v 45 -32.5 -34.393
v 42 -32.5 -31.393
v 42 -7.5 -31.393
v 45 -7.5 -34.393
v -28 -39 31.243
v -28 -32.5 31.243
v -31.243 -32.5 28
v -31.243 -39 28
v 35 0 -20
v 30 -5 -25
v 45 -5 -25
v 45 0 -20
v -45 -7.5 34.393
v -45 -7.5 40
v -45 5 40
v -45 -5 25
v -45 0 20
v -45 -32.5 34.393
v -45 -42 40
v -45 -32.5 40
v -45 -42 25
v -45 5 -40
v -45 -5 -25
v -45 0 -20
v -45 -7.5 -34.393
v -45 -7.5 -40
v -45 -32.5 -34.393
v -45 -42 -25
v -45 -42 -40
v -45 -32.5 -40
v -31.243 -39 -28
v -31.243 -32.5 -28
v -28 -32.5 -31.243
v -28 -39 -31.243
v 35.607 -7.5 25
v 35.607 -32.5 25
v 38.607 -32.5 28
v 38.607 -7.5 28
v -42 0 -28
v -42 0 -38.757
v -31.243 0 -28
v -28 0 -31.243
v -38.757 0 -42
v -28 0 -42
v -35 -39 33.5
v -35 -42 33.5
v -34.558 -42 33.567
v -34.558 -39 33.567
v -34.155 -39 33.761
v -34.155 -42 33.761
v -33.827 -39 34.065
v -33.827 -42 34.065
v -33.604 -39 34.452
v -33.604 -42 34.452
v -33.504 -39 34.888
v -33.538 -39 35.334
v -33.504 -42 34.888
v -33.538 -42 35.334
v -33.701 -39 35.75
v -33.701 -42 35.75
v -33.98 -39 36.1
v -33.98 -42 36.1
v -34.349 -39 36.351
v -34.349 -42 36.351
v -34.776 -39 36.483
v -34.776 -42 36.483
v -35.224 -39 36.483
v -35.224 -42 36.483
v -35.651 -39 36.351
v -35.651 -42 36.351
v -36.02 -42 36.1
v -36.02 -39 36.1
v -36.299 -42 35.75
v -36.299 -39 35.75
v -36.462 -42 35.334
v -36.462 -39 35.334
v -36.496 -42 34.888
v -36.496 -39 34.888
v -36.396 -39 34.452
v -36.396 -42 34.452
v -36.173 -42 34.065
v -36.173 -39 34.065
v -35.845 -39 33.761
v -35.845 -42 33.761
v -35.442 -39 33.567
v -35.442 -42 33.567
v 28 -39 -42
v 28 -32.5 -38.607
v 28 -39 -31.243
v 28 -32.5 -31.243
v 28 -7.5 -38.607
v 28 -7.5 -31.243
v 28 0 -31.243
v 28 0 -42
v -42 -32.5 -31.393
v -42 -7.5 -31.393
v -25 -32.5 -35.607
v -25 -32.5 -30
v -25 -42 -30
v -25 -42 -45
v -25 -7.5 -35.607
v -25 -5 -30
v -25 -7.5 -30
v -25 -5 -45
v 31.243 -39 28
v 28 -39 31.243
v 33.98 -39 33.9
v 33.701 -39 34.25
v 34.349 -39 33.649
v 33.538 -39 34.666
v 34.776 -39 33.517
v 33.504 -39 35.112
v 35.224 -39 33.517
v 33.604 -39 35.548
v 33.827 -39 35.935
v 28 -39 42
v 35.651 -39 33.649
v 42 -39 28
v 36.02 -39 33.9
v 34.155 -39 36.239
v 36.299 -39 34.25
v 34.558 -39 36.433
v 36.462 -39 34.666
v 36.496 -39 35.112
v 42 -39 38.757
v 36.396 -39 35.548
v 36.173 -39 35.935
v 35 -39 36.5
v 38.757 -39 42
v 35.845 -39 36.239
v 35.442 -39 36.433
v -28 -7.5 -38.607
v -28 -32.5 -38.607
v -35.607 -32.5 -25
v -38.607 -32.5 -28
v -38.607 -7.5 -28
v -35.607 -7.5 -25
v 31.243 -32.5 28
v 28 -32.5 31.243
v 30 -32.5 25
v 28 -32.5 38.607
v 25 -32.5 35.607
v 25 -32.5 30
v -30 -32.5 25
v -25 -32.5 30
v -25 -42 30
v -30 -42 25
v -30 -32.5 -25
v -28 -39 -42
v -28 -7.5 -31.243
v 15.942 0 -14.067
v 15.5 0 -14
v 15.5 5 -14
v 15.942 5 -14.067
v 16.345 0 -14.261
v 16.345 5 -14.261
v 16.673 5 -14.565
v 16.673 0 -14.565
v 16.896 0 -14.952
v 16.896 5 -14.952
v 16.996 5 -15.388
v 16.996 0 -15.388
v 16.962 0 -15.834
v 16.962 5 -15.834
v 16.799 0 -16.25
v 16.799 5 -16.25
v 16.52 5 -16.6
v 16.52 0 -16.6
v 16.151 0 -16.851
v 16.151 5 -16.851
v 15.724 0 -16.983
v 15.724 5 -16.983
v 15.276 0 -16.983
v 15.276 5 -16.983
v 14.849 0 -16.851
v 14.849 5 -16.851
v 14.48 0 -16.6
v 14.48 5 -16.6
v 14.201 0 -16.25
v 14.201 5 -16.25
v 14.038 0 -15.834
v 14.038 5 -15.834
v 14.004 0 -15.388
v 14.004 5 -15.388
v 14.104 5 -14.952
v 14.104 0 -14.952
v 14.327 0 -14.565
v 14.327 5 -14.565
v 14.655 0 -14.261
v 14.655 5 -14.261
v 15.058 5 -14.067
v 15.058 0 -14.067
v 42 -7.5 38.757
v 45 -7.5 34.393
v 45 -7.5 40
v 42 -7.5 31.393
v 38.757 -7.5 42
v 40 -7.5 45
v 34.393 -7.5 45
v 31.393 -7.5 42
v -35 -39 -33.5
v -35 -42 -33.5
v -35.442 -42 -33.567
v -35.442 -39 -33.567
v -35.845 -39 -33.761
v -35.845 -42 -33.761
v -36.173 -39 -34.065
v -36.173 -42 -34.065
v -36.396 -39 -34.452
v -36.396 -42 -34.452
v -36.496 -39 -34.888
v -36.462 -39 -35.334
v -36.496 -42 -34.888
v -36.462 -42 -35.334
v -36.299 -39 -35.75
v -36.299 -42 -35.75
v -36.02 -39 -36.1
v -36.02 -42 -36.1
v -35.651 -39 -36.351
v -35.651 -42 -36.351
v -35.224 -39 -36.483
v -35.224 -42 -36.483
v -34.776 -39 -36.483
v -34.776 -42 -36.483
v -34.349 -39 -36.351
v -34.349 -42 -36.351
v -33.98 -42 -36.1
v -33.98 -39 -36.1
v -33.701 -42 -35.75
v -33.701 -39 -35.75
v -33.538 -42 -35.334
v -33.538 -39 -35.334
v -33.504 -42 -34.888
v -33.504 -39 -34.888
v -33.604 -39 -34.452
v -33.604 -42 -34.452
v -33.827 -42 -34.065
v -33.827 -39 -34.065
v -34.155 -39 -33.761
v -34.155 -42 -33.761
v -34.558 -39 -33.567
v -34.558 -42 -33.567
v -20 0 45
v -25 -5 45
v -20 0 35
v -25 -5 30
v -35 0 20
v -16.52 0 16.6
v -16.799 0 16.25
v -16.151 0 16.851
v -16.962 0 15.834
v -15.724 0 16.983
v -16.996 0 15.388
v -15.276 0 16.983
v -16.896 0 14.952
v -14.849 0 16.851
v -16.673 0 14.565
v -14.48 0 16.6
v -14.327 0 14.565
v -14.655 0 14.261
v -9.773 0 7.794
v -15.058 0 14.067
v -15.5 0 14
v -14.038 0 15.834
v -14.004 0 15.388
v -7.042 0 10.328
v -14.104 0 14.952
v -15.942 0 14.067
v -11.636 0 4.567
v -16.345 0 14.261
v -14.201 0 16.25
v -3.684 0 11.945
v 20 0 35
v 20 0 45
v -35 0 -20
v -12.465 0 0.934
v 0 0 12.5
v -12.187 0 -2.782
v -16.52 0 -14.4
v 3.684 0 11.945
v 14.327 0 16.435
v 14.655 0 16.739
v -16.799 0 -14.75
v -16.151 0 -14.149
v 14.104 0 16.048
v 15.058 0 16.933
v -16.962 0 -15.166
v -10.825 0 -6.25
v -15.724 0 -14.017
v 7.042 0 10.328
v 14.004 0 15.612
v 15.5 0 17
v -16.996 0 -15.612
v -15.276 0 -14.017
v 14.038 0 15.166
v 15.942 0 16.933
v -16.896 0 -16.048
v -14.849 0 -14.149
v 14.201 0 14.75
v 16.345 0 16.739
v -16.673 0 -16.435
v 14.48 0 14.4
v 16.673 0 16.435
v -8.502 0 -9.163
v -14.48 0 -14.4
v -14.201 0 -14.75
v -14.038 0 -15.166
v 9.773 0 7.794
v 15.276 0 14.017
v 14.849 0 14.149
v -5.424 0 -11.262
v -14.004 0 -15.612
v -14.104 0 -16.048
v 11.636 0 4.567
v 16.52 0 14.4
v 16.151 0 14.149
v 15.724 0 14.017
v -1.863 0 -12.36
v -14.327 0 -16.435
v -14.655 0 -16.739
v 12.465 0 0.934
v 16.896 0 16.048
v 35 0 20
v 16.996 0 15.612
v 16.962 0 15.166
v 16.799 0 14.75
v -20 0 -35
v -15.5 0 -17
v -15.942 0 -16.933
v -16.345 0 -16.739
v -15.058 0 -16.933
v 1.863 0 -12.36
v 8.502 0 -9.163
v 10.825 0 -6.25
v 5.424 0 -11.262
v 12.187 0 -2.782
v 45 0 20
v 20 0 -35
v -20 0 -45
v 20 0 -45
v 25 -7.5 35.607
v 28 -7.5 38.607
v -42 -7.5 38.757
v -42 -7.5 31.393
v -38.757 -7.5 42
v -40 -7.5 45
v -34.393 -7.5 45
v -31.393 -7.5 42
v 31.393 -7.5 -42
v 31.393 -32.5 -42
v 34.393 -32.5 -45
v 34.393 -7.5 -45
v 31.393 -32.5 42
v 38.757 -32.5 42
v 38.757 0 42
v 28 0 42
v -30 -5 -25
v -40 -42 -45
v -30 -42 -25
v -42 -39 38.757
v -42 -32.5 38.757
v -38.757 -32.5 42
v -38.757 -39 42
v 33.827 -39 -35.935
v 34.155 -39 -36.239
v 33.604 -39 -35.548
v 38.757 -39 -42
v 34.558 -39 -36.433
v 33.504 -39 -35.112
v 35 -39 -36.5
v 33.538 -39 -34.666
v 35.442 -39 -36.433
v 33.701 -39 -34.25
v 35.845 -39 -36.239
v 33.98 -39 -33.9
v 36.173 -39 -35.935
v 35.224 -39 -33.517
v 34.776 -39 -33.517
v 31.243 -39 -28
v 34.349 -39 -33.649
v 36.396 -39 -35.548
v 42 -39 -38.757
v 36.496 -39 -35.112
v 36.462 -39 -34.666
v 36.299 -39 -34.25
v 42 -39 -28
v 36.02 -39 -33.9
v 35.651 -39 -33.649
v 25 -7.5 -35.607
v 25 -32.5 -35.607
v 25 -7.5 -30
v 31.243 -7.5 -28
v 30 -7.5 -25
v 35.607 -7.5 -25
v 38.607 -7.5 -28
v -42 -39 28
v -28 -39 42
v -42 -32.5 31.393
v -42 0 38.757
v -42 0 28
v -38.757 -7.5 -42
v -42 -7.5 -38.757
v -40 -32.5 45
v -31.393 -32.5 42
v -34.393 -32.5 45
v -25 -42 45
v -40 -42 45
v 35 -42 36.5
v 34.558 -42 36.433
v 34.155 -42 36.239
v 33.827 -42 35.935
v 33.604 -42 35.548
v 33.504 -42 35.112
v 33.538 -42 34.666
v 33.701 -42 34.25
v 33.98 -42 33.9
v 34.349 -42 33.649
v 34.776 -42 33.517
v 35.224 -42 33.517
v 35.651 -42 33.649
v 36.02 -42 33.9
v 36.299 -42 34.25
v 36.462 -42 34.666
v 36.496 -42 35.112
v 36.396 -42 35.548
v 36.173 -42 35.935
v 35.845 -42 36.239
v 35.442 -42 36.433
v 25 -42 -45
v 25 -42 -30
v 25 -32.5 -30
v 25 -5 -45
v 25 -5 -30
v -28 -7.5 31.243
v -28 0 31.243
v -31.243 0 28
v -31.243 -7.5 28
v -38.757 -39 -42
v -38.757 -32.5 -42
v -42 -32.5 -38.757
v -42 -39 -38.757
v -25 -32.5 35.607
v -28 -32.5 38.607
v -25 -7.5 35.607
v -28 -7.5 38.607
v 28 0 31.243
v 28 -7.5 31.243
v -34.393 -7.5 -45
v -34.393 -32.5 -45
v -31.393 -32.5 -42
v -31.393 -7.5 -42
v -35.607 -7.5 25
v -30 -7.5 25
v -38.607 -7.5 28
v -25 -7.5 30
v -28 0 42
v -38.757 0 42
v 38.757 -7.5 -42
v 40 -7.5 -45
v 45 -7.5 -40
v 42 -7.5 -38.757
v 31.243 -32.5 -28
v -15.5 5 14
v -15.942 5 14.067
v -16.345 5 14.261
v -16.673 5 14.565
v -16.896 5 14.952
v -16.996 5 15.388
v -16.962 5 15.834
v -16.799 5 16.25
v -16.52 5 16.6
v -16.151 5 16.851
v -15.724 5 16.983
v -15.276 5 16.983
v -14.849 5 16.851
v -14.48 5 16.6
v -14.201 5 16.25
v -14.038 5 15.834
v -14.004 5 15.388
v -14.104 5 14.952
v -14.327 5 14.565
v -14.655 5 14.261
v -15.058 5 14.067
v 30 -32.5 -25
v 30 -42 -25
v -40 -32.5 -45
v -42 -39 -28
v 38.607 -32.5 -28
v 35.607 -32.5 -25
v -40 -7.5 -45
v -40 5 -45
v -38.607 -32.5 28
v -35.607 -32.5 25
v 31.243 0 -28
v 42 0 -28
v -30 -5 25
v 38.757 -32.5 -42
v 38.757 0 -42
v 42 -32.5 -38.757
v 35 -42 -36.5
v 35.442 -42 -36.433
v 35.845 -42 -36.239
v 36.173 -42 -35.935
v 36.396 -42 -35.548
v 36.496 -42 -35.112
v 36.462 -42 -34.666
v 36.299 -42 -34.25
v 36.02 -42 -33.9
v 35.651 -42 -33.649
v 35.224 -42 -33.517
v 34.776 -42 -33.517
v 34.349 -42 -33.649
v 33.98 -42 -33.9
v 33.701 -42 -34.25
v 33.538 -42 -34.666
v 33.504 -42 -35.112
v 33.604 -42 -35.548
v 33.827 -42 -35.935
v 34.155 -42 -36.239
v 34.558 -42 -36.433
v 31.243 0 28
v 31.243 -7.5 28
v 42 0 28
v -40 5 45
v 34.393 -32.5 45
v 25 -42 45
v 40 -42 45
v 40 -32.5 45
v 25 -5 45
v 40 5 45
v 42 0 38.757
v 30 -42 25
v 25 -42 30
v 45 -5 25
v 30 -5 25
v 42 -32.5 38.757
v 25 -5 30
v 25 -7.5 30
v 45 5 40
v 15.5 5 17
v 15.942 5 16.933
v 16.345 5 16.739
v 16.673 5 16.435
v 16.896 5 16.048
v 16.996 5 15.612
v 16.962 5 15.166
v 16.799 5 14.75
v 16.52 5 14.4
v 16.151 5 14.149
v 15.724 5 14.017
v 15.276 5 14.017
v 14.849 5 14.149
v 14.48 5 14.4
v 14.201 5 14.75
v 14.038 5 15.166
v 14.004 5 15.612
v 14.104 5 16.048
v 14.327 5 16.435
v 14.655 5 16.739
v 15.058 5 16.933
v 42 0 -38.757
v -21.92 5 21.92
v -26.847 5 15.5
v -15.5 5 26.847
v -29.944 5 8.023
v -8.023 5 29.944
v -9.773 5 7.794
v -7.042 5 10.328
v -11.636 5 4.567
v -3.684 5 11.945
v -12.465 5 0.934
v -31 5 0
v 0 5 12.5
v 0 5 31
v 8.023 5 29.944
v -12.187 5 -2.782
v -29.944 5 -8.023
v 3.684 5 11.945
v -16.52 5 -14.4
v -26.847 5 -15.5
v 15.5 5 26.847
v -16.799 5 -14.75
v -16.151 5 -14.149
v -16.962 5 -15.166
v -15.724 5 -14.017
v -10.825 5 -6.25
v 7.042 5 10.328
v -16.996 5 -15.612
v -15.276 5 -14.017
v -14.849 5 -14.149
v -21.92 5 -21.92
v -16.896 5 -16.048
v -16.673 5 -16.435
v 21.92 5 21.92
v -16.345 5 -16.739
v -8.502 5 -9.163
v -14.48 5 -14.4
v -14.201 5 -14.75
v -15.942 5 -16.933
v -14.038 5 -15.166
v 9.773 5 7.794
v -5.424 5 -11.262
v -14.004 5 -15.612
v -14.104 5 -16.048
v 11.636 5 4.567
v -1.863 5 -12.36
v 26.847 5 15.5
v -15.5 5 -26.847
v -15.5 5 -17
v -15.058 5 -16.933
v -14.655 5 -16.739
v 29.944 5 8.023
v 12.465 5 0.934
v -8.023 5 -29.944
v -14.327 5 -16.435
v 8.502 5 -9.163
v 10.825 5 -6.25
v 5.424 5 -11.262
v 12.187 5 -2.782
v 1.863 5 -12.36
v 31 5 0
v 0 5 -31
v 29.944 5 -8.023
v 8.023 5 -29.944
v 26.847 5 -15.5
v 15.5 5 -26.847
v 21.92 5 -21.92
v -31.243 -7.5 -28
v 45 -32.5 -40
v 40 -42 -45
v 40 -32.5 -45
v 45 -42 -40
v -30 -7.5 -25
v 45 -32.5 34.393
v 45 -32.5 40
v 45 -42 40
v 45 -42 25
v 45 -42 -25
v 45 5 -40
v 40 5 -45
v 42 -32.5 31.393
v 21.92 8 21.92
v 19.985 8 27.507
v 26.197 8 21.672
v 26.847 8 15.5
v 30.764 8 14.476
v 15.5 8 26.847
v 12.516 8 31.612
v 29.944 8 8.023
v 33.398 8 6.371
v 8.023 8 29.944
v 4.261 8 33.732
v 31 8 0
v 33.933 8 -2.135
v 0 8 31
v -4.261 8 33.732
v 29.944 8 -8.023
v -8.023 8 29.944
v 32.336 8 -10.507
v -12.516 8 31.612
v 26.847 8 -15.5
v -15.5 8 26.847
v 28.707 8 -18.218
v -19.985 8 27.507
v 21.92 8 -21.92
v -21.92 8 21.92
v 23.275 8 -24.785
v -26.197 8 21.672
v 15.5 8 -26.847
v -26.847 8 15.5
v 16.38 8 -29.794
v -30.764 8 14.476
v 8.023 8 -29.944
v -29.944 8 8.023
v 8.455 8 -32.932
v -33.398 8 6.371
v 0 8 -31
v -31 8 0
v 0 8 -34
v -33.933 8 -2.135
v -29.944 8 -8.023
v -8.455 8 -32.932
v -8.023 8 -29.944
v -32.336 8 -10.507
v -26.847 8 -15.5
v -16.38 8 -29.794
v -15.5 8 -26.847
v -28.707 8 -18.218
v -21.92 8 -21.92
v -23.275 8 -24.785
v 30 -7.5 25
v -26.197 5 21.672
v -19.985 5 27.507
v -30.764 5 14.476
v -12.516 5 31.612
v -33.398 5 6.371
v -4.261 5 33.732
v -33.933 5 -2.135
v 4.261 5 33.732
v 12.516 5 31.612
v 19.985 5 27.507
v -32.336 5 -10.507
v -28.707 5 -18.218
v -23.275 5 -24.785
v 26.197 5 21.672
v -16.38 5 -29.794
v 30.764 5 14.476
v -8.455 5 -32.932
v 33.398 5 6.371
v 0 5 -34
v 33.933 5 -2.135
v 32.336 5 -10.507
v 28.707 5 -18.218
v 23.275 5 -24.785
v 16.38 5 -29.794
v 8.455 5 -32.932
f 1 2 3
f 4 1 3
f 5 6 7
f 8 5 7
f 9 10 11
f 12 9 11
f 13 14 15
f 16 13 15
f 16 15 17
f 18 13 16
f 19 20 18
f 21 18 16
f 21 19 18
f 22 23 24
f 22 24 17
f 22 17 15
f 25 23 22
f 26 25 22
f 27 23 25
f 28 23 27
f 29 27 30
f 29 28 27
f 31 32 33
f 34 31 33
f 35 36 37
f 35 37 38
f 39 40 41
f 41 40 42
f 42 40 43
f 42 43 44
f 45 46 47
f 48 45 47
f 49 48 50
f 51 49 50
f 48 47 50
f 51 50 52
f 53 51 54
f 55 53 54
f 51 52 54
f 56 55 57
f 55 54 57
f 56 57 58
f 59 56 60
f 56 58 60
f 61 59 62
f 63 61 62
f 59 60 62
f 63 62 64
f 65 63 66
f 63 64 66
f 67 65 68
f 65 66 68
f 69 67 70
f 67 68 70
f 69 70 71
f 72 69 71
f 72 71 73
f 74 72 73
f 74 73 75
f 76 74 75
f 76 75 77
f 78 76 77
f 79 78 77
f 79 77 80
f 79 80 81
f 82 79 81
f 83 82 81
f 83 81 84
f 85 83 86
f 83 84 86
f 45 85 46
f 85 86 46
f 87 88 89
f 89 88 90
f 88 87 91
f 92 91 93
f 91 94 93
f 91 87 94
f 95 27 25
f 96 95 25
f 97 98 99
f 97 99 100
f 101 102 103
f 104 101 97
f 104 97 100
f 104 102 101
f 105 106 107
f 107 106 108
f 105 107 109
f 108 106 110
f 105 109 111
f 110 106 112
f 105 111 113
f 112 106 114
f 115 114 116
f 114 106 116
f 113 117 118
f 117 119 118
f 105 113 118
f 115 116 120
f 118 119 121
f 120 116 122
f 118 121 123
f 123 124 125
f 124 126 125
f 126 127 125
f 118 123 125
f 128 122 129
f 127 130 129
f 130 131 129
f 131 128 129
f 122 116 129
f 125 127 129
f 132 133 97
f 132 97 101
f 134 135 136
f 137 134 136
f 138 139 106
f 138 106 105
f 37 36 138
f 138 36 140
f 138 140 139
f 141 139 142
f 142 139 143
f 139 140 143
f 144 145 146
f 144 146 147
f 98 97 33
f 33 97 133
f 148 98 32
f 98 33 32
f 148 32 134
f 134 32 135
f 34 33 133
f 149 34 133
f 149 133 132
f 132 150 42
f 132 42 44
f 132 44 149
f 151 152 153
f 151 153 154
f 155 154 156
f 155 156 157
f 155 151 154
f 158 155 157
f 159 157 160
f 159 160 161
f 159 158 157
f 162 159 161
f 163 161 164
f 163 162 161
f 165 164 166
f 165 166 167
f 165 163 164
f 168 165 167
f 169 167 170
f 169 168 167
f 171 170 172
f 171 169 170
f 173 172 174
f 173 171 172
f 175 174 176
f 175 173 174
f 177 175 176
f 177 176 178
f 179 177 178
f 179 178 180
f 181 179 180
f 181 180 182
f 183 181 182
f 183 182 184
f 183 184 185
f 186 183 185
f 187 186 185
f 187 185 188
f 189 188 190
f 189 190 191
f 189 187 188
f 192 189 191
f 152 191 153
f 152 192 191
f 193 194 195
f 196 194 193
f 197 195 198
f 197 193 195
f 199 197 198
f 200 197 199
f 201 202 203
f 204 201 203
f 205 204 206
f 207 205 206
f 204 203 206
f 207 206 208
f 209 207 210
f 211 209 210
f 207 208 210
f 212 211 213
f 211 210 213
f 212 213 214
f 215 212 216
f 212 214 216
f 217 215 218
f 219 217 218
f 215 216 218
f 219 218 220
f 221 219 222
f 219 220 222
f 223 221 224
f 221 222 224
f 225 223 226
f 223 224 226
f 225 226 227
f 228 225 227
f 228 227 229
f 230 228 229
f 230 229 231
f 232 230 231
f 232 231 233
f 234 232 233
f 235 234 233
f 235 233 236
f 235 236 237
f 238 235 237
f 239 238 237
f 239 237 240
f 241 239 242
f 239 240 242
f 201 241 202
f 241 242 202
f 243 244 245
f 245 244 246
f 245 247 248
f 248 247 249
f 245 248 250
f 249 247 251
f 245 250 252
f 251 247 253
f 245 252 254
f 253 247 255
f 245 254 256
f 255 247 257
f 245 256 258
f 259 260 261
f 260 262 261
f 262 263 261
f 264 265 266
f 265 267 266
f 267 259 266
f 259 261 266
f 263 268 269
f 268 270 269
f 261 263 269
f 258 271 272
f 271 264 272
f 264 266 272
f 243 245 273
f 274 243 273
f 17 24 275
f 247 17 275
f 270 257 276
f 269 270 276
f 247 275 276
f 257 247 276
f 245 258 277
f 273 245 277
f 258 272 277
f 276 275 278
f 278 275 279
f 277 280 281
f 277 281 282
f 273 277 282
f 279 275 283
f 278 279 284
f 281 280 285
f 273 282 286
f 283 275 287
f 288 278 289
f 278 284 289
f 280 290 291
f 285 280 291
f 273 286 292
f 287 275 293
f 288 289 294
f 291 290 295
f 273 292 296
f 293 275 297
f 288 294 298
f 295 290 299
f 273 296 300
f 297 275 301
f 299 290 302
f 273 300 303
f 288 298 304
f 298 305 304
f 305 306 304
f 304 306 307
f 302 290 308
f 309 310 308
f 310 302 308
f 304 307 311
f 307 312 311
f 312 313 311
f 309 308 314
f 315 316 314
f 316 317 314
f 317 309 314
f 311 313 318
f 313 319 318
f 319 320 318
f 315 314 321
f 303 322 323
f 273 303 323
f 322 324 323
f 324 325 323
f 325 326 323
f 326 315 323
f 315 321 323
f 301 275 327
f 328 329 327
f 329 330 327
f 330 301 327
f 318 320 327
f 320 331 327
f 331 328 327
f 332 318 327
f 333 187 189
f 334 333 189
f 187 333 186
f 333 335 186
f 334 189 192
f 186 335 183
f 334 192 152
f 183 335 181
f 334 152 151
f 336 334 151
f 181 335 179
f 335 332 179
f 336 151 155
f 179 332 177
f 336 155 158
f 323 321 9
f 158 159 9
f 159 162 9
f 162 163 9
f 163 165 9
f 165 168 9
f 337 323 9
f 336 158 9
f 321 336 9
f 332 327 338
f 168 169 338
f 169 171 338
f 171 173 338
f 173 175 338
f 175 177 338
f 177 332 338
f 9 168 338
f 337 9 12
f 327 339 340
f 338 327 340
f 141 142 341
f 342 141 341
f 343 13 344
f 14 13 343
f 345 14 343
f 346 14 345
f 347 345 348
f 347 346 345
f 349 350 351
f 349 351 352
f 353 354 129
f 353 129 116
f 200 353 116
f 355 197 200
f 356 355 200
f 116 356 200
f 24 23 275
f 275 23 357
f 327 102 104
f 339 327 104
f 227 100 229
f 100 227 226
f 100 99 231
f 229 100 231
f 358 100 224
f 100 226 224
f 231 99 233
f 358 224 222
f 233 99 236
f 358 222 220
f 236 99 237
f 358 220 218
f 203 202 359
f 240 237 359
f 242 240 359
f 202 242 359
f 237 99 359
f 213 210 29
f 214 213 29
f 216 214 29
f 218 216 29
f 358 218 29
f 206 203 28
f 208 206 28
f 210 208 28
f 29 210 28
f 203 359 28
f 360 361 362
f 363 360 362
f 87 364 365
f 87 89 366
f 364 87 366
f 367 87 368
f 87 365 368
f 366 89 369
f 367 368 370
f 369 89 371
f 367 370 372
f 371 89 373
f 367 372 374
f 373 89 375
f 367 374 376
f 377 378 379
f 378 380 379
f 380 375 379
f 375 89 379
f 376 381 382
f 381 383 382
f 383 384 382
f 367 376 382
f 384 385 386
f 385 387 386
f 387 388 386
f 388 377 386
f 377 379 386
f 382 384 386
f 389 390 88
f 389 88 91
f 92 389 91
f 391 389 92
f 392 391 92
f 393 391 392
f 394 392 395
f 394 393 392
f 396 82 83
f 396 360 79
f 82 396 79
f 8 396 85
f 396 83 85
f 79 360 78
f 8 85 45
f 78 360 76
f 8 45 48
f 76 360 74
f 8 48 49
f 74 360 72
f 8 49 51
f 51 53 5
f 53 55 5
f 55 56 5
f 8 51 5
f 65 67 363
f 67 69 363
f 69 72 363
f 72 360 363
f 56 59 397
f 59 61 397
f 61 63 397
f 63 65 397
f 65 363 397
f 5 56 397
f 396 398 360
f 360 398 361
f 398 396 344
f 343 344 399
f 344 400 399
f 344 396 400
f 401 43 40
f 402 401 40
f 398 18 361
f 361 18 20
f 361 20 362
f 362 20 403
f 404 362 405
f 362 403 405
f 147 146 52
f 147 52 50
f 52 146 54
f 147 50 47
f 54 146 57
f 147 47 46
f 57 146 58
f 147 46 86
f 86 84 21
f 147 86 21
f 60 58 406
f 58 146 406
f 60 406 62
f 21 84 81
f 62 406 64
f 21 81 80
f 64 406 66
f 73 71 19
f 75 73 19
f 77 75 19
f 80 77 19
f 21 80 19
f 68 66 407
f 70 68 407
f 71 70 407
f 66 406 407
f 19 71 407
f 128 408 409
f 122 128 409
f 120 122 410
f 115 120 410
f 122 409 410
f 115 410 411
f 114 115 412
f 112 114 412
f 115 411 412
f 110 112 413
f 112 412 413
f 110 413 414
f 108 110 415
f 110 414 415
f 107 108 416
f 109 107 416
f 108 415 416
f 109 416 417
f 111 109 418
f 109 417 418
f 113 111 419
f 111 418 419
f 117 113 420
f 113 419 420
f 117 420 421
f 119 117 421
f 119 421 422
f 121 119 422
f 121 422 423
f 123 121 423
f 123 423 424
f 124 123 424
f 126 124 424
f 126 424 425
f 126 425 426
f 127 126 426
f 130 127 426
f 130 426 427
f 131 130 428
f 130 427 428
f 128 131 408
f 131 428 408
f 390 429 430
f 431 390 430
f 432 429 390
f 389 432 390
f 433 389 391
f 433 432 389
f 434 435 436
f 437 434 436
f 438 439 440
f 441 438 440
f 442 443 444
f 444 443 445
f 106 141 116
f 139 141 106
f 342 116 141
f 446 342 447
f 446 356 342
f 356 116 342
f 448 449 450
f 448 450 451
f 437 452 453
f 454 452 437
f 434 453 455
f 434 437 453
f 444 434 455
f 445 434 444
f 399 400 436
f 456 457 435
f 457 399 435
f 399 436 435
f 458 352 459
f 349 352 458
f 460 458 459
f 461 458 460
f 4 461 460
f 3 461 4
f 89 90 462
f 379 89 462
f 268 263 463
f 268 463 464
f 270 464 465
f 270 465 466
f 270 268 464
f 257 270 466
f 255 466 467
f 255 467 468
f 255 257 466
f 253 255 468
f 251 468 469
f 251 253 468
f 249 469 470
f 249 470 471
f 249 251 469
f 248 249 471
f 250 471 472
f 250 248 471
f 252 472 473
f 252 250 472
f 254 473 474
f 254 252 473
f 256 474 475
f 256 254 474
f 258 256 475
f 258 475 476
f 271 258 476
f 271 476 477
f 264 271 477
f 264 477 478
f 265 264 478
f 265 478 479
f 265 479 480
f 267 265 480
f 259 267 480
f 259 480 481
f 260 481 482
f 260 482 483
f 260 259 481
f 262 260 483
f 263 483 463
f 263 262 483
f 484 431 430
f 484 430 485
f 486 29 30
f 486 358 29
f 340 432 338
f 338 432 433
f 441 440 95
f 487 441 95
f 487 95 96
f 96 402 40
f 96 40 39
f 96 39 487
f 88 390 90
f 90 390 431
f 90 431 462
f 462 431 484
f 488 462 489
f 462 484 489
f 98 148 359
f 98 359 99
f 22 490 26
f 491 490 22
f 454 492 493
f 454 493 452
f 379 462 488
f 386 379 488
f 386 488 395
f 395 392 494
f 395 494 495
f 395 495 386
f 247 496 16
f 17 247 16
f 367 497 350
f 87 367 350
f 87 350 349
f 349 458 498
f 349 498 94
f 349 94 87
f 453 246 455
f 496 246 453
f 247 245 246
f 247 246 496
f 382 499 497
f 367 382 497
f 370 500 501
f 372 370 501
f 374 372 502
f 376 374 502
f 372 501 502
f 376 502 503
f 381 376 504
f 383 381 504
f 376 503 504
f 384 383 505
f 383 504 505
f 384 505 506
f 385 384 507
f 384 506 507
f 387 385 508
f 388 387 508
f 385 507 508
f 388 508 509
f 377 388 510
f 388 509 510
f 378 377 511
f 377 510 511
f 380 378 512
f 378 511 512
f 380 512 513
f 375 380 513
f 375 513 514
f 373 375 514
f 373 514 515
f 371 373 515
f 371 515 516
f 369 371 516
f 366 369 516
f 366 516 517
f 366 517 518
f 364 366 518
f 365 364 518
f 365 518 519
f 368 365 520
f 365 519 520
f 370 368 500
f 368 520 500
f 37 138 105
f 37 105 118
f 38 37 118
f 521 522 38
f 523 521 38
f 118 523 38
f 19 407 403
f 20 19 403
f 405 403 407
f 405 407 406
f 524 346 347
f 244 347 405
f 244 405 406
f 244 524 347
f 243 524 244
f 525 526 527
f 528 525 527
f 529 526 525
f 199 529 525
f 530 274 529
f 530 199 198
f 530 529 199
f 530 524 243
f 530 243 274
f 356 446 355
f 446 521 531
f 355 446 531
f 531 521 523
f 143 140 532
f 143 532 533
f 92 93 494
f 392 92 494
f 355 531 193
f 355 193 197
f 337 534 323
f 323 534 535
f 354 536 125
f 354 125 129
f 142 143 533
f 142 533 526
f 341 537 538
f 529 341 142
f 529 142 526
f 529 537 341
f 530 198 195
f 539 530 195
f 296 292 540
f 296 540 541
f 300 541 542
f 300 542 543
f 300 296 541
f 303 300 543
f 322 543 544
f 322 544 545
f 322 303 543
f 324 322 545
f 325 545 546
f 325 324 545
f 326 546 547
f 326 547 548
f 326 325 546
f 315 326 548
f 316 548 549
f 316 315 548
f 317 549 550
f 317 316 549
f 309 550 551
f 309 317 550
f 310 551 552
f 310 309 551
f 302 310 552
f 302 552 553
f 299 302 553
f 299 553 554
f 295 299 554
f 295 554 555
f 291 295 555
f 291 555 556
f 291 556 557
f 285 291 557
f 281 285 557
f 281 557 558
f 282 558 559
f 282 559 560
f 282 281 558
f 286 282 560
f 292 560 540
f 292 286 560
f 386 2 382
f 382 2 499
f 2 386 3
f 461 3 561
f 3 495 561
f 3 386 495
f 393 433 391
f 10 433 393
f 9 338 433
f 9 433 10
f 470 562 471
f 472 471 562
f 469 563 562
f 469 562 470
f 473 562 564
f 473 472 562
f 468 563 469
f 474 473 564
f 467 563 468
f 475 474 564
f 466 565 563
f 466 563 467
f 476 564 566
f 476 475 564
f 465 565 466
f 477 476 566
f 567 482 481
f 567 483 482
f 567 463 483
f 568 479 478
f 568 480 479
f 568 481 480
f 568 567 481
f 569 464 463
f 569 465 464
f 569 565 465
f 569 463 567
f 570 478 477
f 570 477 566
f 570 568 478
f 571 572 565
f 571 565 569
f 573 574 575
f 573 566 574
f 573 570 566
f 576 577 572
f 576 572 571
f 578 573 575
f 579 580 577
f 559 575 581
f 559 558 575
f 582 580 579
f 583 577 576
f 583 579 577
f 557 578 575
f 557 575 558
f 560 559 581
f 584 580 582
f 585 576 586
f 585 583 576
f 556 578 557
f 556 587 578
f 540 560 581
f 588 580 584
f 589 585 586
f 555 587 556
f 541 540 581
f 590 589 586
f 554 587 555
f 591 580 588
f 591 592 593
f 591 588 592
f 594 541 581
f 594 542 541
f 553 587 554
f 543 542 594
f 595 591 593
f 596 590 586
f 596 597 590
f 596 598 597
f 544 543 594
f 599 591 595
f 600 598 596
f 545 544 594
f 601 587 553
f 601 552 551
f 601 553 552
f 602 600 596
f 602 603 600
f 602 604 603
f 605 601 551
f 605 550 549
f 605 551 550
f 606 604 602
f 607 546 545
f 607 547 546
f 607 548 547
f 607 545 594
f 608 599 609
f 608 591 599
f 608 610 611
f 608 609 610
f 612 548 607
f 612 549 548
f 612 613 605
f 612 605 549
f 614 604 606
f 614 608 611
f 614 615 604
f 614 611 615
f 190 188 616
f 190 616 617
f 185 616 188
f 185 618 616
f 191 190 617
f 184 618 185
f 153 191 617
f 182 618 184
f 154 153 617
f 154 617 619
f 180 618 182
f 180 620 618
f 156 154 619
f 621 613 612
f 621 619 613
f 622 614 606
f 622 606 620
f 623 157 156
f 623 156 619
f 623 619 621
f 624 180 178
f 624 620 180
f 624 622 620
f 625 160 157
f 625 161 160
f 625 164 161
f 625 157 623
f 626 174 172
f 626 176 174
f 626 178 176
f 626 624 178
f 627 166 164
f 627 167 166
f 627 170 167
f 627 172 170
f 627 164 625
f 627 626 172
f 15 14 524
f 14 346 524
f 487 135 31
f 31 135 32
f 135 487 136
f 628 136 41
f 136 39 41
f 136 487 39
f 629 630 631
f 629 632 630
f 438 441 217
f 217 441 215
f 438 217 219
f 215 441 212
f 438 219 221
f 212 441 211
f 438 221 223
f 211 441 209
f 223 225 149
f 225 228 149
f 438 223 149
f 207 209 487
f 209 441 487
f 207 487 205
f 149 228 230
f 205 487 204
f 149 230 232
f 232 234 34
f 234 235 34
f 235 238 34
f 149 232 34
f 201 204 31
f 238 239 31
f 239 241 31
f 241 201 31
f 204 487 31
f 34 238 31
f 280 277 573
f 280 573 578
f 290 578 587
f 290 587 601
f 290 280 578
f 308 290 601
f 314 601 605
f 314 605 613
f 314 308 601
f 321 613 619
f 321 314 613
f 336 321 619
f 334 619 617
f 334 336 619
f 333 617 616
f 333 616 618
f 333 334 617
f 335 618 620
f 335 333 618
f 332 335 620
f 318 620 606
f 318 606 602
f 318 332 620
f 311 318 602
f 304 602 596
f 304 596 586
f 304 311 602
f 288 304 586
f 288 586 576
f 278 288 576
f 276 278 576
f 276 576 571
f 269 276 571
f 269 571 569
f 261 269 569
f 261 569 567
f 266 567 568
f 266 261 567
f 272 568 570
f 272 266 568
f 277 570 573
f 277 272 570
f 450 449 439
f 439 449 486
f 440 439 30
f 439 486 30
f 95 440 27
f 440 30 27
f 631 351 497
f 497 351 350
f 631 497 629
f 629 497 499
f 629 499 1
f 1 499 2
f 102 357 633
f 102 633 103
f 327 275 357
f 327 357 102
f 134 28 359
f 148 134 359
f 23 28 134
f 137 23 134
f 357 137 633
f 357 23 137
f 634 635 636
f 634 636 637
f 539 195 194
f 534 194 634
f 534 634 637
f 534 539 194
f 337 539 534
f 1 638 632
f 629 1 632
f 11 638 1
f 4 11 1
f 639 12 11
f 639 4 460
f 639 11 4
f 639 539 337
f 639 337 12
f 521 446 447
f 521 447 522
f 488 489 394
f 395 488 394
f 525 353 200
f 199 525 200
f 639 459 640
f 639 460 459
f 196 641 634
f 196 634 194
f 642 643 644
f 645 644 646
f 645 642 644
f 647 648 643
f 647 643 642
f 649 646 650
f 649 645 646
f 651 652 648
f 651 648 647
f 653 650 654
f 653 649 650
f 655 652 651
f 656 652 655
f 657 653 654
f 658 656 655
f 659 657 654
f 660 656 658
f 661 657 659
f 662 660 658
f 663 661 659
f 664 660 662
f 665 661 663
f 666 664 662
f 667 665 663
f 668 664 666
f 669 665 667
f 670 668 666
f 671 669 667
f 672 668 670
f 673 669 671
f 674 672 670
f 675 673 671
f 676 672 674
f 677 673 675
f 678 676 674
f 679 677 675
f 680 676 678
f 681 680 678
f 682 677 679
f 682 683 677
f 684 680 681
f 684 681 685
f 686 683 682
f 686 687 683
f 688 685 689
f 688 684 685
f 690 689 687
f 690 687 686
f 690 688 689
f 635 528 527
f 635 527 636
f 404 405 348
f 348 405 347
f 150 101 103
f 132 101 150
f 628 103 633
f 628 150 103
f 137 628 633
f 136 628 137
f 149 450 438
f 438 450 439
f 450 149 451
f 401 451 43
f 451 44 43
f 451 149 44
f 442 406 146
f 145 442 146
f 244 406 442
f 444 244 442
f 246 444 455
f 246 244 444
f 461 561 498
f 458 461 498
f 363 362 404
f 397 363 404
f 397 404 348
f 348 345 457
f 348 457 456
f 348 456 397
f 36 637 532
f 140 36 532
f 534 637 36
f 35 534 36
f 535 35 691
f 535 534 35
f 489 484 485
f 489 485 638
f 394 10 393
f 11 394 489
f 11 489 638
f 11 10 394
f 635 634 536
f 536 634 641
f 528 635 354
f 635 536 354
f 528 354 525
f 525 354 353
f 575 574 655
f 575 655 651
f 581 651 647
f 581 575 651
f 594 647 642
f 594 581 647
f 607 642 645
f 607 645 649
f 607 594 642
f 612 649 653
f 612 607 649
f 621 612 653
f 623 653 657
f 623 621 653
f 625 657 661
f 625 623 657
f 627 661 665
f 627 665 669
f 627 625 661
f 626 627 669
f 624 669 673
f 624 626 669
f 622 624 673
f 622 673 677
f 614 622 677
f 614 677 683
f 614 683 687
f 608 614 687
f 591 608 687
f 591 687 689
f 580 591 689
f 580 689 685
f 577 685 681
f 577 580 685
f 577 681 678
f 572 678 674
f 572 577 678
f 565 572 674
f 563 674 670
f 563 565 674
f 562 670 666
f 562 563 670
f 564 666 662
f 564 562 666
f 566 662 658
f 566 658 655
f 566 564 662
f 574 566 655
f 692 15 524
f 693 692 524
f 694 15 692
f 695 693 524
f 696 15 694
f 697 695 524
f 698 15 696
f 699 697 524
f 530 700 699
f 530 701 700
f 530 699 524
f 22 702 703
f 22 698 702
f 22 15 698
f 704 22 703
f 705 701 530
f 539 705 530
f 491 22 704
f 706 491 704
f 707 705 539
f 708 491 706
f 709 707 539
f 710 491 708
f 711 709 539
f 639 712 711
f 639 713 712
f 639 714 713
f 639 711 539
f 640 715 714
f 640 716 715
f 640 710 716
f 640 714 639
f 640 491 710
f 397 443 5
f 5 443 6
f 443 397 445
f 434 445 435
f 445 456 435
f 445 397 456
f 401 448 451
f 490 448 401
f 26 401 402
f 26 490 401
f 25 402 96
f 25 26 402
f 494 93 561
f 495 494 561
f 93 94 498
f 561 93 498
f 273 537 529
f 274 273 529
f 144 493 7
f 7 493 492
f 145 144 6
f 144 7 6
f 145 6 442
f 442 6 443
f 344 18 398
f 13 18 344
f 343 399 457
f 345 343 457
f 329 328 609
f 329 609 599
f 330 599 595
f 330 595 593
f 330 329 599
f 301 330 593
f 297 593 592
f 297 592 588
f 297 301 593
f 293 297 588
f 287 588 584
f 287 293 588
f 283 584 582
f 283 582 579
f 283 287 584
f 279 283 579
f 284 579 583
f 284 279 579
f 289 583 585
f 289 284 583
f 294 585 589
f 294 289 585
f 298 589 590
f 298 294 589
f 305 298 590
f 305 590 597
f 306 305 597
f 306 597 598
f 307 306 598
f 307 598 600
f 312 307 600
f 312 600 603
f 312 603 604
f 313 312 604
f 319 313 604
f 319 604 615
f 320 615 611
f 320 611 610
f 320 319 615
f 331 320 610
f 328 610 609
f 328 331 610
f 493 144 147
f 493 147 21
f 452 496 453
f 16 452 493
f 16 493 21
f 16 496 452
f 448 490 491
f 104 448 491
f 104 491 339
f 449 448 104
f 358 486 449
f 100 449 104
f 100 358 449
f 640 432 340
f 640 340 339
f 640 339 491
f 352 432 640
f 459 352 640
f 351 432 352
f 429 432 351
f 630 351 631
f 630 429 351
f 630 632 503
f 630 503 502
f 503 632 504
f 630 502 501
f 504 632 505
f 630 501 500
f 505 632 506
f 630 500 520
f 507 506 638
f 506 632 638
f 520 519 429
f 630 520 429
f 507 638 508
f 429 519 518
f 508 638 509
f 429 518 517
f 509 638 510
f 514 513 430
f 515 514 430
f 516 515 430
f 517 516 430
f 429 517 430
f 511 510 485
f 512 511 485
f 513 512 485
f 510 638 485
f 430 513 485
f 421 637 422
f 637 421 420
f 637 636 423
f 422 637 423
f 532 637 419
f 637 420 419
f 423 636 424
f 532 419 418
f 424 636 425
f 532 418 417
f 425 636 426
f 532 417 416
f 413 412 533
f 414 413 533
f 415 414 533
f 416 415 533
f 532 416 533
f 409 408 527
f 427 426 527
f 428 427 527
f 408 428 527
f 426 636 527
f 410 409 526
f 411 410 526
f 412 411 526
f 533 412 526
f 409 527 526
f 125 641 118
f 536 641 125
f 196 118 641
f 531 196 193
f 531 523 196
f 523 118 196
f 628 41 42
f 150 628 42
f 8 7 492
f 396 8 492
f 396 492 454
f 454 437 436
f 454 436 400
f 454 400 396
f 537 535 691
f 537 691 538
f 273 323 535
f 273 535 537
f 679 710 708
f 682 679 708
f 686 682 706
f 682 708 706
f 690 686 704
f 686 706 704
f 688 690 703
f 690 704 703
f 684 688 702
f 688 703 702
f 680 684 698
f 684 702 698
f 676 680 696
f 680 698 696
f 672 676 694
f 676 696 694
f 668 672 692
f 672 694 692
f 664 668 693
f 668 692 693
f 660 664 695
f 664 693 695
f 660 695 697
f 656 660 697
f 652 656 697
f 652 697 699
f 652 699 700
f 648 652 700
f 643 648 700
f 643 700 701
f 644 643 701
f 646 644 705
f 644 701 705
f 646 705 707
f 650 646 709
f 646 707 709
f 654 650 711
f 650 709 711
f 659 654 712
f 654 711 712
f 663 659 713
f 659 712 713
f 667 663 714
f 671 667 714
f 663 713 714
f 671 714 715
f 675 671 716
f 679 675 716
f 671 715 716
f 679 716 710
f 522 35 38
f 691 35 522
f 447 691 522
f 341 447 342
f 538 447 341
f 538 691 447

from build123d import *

# Parameters (mm, degrees)
SKETCH_1_W               = 90
SKETCH_1_H               = 90.00000171
SKETCH_1_R               = 12.5
SKETCH_1_R_2             = 1.5
EXTRUDE_1_DEPTH          = 5
CHAMFER_1_SIZE           = 5
SKETCH_2_R               = 34
SKETCH_2_R_2             = 31
EXTRUDE_2_DEPTH          = 3
EXTRUDE_3_DEPTH          = 42
CHAMFER_2_SIZE           = 5
SKETCH_4_W               = 15
SKETCH_4_H               = 25
CUT_EXTRUDE_1_DEPTH      = 157
PATTERN_CIRCULAR_1_COUNT = 2
PATTERN_CIRCULAR_1_ANGLE = 90
SKETCH_5_R               = 1.5
EXTRUDE_4_DEPTH          = 3


with BuildPart() as part:
    # 草图1 → 凸台-拉伸1 (new body)
    with BuildSketch(Plane(origin=(0, 0, 0), x_dir=(1, 0, 0), z_dir=(0, 1, 0))):
        Rectangle(SKETCH_1_W, SKETCH_1_H)
        with Locations(Location((0, 0, 0), (0, 0, 270))):
            Circle(SKETCH_1_R, mode=Mode.SUBTRACT)
        with Locations(Location((15.5, 15.500000294, 0), (0, 0, 270))):
            Circle(SKETCH_1_R_2, mode=Mode.SUBTRACT)
        with Locations(Location((-15.500000589, -15.499999706, 0), (0, 0, 90))):
            Circle(SKETCH_1_R_2, mode=Mode.SUBTRACT)
        with Locations(Location((15.500000589, -15.499999706, 0), (0, 0, 270))):
            Circle(SKETCH_1_R_2, mode=Mode.SUBTRACT)
        with Locations(Location((-15.5, 15.500000294, 0), (0, 0, 90))):
            Circle(SKETCH_1_R_2, mode=Mode.SUBTRACT)
    extrude(amount=EXTRUDE_1_DEPTH)

    # 倒角1
    chamfer_1_edges = [part.edges().sort_by_distance(p)[0] for p in [
        (45, 2.5, 45.000000855),
        (-45, 2.5, 45.000000855),
        (-45, 2.5, -45.000000855),
        (45, 2.5, -45.000000855),
    ]]
    chamfer(chamfer_1_edges, length=CHAMFER_1_SIZE)

    # 草图2 → 凸台-拉伸2 (add)
    with BuildSketch(Plane(origin=(0, 5, 0), x_dir=(1, 0, 0), z_dir=(0, 1, 0))):
        with Locations(Location((0, 0, 0), (0, 0, 90))):
            Circle(SKETCH_2_R)
        with Locations(Location((0, 0, 0), (0, 0, 270))):
            Circle(SKETCH_2_R_2, mode=Mode.SUBTRACT)
    extrude(amount=EXTRUDE_2_DEPTH)

    # 草图3 → 凸台-拉伸3 (add)
    # profile 1 of 4: a face of its own
    with BuildSketch(Plane.XZ):
        Polygon((25, 45.000000855), (40, 45.000000855), (45, 40.000000855), (45, 25.000000855), (30, 25.000000855), (25, 30.000000855), align=None)
        Polygon((28, 31.242641542), (31.242640687, 28.000000855), (42, 28.000000855), (42, 38.757360167), (38.757359313, 42.000000855), (28, 42.000000855), align=None, mode=Mode.SUBTRACT)
    # profile 2 of 4: a face of its own
    with BuildSketch(Plane.XZ):
        Polygon((25, -45.000000855), (25, -30.000000855), (30, -25.000000855), (45, -25.000000855), (45, -40.000000855), (40, -45.000000855), align=None)
        Polygon((28, -42.000000855), (28, -31.242641542), (31.242640687, -28.000000855), (42, -28.000000855), (42, -38.757360167), (38.757359313, -42.000000855), align=None, mode=Mode.SUBTRACT)
    # profile 3 of 4: a face of its own
    with BuildSketch(Plane.XZ):
        Polygon((-25, -45.000000855), (-40, -45.000000855), (-45, -40.000000855), (-45, -25.000000855), (-30, -25.000000855), (-25, -30.000000855), align=None)
        Polygon((-28, -42.000000855), (-38.757359313, -42.000000855), (-42, -38.757360167), (-42, -28.000000855), (-31.242640687, -28.000000855), (-28, -31.242641542), align=None, mode=Mode.SUBTRACT)
    # profile 4 of 4: a face of its own
    with BuildSketch(Plane.XZ):
        Polygon((-25, 45.000000855), (-25, 30.000000855), (-30, 25.000000855), (-45, 25.000000855), (-45, 40.000000855), (-40, 45.000000855), align=None)
        Polygon((-28, 42.000000855), (-28, 31.242641542), (-31.242640687, 28.000000855), (-42, 28.000000855), (-42, 38.757360167), (-38.757359313, 42.000000855), align=None, mode=Mode.SUBTRACT)
    extrude(amount=EXTRUDE_3_DEPTH)

    # 倒角2
    chamfer_2_edges = [part.edges().sort_by_distance(p)[0] for p in [
        (37.5, 0, -25.000000855),
        (25, 0, -37.500000855),
        (-25, 0, -37.500000855),
        (-37.5, 0, -25.000000855),
        (-37.5, 0, 25.000000855),
        (-25, 0, 37.500000855),
        (25, 0, 37.500000855),
        (37.5, 0, 25.000000855),
    ]]
    chamfer(chamfer_2_edges, length=CHAMFER_2_SIZE)

    # 草图4 → 切除-拉伸1 (cut)
    with BuildSketch(Plane(origin=(-42.500000427, 0, 42.500000427), x_dir=(0.7071067811865456, 0, 0.7071067811865495), z_dir=(-0.7071067811865495, 0, 0.7071067811865456))):
        with Locations((0, -20)):
            Rectangle(SKETCH_4_W, SKETCH_4_H)
    cut_extrude_1 = extrude(amount=-CUT_EXTRUDE_1_DEPTH, mode=Mode.SUBTRACT)

    # 阵列(圆周)1: 切除-拉伸1 ×2 about axis
    pattern_circular_1_axis = Axis((0, 8, 0), (0, -1, 0))
    for i in range(1, PATTERN_CIRCULAR_1_COUNT):
        add(cut_extrude_1.rotate(pattern_circular_1_axis, i * PATTERN_CIRCULAR_1_ANGLE / (PATTERN_CIRCULAR_1_COUNT - 1)), mode=Mode.SUBTRACT)

    # 草图5 → 凸台-拉伸4 (add)
    # profile 1 of 4: a face of its own
    with BuildSketch(Plane.XZ.offset(42)):
        Polygon((-25, -45.000000855), (-25, -30.000000855), (-30, -25.000000855), (-45, -25.000000855), (-45, -40.000000855), (-40, -45.000000855), align=None)
        with Locations(Location((-35, -35.000000855, 0), (0, 0, 90))):
            Circle(SKETCH_5_R, mode=Mode.SUBTRACT)
    # profile 2 of 4: a face of its own
    with BuildSketch(Plane.XZ.offset(42)):
        Polygon((40, -45.000000855), (45, -40.000000855), (45, -25.000000855), (30, -25.000000855), (25, -30.000000855), (25, -45.000000855), align=None)
        with Locations(Location((35, -35.000000855, 0), (0, 0, 270))):
            Circle(SKETCH_5_R, mode=Mode.SUBTRACT)
    # profile 3 of 4: a face of its own
    with BuildSketch(Plane.XZ.offset(42)):
        Polygon((25, 45.000000855), (25, 30.000000855), (30, 25.000000855), (45, 25.000000855), (45, 40.000000855), (40, 45.000000855), align=None)
        with Locations(Location((35, 35.000000855, 0), (0, 0, 90))):
            Circle(SKETCH_5_R, mode=Mode.SUBTRACT)
    # profile 4 of 4: a face of its own
    with BuildSketch(Plane.XZ.offset(42)):
        Polygon((-40, 45.000000855), (-45, 40.000000855), (-45, 25.000000855), (-30, 25.000000855), (-25, 30.000000855), (-25, 45.000000855), align=None)
        with Locations(Location((-35, 35.000000855, 0), (0, 0, 270))):
            Circle(SKETCH_5_R, mode=Mode.SUBTRACT)
    extrude(amount=-EXTRUDE_4_DEPTH)


solid = part.part
